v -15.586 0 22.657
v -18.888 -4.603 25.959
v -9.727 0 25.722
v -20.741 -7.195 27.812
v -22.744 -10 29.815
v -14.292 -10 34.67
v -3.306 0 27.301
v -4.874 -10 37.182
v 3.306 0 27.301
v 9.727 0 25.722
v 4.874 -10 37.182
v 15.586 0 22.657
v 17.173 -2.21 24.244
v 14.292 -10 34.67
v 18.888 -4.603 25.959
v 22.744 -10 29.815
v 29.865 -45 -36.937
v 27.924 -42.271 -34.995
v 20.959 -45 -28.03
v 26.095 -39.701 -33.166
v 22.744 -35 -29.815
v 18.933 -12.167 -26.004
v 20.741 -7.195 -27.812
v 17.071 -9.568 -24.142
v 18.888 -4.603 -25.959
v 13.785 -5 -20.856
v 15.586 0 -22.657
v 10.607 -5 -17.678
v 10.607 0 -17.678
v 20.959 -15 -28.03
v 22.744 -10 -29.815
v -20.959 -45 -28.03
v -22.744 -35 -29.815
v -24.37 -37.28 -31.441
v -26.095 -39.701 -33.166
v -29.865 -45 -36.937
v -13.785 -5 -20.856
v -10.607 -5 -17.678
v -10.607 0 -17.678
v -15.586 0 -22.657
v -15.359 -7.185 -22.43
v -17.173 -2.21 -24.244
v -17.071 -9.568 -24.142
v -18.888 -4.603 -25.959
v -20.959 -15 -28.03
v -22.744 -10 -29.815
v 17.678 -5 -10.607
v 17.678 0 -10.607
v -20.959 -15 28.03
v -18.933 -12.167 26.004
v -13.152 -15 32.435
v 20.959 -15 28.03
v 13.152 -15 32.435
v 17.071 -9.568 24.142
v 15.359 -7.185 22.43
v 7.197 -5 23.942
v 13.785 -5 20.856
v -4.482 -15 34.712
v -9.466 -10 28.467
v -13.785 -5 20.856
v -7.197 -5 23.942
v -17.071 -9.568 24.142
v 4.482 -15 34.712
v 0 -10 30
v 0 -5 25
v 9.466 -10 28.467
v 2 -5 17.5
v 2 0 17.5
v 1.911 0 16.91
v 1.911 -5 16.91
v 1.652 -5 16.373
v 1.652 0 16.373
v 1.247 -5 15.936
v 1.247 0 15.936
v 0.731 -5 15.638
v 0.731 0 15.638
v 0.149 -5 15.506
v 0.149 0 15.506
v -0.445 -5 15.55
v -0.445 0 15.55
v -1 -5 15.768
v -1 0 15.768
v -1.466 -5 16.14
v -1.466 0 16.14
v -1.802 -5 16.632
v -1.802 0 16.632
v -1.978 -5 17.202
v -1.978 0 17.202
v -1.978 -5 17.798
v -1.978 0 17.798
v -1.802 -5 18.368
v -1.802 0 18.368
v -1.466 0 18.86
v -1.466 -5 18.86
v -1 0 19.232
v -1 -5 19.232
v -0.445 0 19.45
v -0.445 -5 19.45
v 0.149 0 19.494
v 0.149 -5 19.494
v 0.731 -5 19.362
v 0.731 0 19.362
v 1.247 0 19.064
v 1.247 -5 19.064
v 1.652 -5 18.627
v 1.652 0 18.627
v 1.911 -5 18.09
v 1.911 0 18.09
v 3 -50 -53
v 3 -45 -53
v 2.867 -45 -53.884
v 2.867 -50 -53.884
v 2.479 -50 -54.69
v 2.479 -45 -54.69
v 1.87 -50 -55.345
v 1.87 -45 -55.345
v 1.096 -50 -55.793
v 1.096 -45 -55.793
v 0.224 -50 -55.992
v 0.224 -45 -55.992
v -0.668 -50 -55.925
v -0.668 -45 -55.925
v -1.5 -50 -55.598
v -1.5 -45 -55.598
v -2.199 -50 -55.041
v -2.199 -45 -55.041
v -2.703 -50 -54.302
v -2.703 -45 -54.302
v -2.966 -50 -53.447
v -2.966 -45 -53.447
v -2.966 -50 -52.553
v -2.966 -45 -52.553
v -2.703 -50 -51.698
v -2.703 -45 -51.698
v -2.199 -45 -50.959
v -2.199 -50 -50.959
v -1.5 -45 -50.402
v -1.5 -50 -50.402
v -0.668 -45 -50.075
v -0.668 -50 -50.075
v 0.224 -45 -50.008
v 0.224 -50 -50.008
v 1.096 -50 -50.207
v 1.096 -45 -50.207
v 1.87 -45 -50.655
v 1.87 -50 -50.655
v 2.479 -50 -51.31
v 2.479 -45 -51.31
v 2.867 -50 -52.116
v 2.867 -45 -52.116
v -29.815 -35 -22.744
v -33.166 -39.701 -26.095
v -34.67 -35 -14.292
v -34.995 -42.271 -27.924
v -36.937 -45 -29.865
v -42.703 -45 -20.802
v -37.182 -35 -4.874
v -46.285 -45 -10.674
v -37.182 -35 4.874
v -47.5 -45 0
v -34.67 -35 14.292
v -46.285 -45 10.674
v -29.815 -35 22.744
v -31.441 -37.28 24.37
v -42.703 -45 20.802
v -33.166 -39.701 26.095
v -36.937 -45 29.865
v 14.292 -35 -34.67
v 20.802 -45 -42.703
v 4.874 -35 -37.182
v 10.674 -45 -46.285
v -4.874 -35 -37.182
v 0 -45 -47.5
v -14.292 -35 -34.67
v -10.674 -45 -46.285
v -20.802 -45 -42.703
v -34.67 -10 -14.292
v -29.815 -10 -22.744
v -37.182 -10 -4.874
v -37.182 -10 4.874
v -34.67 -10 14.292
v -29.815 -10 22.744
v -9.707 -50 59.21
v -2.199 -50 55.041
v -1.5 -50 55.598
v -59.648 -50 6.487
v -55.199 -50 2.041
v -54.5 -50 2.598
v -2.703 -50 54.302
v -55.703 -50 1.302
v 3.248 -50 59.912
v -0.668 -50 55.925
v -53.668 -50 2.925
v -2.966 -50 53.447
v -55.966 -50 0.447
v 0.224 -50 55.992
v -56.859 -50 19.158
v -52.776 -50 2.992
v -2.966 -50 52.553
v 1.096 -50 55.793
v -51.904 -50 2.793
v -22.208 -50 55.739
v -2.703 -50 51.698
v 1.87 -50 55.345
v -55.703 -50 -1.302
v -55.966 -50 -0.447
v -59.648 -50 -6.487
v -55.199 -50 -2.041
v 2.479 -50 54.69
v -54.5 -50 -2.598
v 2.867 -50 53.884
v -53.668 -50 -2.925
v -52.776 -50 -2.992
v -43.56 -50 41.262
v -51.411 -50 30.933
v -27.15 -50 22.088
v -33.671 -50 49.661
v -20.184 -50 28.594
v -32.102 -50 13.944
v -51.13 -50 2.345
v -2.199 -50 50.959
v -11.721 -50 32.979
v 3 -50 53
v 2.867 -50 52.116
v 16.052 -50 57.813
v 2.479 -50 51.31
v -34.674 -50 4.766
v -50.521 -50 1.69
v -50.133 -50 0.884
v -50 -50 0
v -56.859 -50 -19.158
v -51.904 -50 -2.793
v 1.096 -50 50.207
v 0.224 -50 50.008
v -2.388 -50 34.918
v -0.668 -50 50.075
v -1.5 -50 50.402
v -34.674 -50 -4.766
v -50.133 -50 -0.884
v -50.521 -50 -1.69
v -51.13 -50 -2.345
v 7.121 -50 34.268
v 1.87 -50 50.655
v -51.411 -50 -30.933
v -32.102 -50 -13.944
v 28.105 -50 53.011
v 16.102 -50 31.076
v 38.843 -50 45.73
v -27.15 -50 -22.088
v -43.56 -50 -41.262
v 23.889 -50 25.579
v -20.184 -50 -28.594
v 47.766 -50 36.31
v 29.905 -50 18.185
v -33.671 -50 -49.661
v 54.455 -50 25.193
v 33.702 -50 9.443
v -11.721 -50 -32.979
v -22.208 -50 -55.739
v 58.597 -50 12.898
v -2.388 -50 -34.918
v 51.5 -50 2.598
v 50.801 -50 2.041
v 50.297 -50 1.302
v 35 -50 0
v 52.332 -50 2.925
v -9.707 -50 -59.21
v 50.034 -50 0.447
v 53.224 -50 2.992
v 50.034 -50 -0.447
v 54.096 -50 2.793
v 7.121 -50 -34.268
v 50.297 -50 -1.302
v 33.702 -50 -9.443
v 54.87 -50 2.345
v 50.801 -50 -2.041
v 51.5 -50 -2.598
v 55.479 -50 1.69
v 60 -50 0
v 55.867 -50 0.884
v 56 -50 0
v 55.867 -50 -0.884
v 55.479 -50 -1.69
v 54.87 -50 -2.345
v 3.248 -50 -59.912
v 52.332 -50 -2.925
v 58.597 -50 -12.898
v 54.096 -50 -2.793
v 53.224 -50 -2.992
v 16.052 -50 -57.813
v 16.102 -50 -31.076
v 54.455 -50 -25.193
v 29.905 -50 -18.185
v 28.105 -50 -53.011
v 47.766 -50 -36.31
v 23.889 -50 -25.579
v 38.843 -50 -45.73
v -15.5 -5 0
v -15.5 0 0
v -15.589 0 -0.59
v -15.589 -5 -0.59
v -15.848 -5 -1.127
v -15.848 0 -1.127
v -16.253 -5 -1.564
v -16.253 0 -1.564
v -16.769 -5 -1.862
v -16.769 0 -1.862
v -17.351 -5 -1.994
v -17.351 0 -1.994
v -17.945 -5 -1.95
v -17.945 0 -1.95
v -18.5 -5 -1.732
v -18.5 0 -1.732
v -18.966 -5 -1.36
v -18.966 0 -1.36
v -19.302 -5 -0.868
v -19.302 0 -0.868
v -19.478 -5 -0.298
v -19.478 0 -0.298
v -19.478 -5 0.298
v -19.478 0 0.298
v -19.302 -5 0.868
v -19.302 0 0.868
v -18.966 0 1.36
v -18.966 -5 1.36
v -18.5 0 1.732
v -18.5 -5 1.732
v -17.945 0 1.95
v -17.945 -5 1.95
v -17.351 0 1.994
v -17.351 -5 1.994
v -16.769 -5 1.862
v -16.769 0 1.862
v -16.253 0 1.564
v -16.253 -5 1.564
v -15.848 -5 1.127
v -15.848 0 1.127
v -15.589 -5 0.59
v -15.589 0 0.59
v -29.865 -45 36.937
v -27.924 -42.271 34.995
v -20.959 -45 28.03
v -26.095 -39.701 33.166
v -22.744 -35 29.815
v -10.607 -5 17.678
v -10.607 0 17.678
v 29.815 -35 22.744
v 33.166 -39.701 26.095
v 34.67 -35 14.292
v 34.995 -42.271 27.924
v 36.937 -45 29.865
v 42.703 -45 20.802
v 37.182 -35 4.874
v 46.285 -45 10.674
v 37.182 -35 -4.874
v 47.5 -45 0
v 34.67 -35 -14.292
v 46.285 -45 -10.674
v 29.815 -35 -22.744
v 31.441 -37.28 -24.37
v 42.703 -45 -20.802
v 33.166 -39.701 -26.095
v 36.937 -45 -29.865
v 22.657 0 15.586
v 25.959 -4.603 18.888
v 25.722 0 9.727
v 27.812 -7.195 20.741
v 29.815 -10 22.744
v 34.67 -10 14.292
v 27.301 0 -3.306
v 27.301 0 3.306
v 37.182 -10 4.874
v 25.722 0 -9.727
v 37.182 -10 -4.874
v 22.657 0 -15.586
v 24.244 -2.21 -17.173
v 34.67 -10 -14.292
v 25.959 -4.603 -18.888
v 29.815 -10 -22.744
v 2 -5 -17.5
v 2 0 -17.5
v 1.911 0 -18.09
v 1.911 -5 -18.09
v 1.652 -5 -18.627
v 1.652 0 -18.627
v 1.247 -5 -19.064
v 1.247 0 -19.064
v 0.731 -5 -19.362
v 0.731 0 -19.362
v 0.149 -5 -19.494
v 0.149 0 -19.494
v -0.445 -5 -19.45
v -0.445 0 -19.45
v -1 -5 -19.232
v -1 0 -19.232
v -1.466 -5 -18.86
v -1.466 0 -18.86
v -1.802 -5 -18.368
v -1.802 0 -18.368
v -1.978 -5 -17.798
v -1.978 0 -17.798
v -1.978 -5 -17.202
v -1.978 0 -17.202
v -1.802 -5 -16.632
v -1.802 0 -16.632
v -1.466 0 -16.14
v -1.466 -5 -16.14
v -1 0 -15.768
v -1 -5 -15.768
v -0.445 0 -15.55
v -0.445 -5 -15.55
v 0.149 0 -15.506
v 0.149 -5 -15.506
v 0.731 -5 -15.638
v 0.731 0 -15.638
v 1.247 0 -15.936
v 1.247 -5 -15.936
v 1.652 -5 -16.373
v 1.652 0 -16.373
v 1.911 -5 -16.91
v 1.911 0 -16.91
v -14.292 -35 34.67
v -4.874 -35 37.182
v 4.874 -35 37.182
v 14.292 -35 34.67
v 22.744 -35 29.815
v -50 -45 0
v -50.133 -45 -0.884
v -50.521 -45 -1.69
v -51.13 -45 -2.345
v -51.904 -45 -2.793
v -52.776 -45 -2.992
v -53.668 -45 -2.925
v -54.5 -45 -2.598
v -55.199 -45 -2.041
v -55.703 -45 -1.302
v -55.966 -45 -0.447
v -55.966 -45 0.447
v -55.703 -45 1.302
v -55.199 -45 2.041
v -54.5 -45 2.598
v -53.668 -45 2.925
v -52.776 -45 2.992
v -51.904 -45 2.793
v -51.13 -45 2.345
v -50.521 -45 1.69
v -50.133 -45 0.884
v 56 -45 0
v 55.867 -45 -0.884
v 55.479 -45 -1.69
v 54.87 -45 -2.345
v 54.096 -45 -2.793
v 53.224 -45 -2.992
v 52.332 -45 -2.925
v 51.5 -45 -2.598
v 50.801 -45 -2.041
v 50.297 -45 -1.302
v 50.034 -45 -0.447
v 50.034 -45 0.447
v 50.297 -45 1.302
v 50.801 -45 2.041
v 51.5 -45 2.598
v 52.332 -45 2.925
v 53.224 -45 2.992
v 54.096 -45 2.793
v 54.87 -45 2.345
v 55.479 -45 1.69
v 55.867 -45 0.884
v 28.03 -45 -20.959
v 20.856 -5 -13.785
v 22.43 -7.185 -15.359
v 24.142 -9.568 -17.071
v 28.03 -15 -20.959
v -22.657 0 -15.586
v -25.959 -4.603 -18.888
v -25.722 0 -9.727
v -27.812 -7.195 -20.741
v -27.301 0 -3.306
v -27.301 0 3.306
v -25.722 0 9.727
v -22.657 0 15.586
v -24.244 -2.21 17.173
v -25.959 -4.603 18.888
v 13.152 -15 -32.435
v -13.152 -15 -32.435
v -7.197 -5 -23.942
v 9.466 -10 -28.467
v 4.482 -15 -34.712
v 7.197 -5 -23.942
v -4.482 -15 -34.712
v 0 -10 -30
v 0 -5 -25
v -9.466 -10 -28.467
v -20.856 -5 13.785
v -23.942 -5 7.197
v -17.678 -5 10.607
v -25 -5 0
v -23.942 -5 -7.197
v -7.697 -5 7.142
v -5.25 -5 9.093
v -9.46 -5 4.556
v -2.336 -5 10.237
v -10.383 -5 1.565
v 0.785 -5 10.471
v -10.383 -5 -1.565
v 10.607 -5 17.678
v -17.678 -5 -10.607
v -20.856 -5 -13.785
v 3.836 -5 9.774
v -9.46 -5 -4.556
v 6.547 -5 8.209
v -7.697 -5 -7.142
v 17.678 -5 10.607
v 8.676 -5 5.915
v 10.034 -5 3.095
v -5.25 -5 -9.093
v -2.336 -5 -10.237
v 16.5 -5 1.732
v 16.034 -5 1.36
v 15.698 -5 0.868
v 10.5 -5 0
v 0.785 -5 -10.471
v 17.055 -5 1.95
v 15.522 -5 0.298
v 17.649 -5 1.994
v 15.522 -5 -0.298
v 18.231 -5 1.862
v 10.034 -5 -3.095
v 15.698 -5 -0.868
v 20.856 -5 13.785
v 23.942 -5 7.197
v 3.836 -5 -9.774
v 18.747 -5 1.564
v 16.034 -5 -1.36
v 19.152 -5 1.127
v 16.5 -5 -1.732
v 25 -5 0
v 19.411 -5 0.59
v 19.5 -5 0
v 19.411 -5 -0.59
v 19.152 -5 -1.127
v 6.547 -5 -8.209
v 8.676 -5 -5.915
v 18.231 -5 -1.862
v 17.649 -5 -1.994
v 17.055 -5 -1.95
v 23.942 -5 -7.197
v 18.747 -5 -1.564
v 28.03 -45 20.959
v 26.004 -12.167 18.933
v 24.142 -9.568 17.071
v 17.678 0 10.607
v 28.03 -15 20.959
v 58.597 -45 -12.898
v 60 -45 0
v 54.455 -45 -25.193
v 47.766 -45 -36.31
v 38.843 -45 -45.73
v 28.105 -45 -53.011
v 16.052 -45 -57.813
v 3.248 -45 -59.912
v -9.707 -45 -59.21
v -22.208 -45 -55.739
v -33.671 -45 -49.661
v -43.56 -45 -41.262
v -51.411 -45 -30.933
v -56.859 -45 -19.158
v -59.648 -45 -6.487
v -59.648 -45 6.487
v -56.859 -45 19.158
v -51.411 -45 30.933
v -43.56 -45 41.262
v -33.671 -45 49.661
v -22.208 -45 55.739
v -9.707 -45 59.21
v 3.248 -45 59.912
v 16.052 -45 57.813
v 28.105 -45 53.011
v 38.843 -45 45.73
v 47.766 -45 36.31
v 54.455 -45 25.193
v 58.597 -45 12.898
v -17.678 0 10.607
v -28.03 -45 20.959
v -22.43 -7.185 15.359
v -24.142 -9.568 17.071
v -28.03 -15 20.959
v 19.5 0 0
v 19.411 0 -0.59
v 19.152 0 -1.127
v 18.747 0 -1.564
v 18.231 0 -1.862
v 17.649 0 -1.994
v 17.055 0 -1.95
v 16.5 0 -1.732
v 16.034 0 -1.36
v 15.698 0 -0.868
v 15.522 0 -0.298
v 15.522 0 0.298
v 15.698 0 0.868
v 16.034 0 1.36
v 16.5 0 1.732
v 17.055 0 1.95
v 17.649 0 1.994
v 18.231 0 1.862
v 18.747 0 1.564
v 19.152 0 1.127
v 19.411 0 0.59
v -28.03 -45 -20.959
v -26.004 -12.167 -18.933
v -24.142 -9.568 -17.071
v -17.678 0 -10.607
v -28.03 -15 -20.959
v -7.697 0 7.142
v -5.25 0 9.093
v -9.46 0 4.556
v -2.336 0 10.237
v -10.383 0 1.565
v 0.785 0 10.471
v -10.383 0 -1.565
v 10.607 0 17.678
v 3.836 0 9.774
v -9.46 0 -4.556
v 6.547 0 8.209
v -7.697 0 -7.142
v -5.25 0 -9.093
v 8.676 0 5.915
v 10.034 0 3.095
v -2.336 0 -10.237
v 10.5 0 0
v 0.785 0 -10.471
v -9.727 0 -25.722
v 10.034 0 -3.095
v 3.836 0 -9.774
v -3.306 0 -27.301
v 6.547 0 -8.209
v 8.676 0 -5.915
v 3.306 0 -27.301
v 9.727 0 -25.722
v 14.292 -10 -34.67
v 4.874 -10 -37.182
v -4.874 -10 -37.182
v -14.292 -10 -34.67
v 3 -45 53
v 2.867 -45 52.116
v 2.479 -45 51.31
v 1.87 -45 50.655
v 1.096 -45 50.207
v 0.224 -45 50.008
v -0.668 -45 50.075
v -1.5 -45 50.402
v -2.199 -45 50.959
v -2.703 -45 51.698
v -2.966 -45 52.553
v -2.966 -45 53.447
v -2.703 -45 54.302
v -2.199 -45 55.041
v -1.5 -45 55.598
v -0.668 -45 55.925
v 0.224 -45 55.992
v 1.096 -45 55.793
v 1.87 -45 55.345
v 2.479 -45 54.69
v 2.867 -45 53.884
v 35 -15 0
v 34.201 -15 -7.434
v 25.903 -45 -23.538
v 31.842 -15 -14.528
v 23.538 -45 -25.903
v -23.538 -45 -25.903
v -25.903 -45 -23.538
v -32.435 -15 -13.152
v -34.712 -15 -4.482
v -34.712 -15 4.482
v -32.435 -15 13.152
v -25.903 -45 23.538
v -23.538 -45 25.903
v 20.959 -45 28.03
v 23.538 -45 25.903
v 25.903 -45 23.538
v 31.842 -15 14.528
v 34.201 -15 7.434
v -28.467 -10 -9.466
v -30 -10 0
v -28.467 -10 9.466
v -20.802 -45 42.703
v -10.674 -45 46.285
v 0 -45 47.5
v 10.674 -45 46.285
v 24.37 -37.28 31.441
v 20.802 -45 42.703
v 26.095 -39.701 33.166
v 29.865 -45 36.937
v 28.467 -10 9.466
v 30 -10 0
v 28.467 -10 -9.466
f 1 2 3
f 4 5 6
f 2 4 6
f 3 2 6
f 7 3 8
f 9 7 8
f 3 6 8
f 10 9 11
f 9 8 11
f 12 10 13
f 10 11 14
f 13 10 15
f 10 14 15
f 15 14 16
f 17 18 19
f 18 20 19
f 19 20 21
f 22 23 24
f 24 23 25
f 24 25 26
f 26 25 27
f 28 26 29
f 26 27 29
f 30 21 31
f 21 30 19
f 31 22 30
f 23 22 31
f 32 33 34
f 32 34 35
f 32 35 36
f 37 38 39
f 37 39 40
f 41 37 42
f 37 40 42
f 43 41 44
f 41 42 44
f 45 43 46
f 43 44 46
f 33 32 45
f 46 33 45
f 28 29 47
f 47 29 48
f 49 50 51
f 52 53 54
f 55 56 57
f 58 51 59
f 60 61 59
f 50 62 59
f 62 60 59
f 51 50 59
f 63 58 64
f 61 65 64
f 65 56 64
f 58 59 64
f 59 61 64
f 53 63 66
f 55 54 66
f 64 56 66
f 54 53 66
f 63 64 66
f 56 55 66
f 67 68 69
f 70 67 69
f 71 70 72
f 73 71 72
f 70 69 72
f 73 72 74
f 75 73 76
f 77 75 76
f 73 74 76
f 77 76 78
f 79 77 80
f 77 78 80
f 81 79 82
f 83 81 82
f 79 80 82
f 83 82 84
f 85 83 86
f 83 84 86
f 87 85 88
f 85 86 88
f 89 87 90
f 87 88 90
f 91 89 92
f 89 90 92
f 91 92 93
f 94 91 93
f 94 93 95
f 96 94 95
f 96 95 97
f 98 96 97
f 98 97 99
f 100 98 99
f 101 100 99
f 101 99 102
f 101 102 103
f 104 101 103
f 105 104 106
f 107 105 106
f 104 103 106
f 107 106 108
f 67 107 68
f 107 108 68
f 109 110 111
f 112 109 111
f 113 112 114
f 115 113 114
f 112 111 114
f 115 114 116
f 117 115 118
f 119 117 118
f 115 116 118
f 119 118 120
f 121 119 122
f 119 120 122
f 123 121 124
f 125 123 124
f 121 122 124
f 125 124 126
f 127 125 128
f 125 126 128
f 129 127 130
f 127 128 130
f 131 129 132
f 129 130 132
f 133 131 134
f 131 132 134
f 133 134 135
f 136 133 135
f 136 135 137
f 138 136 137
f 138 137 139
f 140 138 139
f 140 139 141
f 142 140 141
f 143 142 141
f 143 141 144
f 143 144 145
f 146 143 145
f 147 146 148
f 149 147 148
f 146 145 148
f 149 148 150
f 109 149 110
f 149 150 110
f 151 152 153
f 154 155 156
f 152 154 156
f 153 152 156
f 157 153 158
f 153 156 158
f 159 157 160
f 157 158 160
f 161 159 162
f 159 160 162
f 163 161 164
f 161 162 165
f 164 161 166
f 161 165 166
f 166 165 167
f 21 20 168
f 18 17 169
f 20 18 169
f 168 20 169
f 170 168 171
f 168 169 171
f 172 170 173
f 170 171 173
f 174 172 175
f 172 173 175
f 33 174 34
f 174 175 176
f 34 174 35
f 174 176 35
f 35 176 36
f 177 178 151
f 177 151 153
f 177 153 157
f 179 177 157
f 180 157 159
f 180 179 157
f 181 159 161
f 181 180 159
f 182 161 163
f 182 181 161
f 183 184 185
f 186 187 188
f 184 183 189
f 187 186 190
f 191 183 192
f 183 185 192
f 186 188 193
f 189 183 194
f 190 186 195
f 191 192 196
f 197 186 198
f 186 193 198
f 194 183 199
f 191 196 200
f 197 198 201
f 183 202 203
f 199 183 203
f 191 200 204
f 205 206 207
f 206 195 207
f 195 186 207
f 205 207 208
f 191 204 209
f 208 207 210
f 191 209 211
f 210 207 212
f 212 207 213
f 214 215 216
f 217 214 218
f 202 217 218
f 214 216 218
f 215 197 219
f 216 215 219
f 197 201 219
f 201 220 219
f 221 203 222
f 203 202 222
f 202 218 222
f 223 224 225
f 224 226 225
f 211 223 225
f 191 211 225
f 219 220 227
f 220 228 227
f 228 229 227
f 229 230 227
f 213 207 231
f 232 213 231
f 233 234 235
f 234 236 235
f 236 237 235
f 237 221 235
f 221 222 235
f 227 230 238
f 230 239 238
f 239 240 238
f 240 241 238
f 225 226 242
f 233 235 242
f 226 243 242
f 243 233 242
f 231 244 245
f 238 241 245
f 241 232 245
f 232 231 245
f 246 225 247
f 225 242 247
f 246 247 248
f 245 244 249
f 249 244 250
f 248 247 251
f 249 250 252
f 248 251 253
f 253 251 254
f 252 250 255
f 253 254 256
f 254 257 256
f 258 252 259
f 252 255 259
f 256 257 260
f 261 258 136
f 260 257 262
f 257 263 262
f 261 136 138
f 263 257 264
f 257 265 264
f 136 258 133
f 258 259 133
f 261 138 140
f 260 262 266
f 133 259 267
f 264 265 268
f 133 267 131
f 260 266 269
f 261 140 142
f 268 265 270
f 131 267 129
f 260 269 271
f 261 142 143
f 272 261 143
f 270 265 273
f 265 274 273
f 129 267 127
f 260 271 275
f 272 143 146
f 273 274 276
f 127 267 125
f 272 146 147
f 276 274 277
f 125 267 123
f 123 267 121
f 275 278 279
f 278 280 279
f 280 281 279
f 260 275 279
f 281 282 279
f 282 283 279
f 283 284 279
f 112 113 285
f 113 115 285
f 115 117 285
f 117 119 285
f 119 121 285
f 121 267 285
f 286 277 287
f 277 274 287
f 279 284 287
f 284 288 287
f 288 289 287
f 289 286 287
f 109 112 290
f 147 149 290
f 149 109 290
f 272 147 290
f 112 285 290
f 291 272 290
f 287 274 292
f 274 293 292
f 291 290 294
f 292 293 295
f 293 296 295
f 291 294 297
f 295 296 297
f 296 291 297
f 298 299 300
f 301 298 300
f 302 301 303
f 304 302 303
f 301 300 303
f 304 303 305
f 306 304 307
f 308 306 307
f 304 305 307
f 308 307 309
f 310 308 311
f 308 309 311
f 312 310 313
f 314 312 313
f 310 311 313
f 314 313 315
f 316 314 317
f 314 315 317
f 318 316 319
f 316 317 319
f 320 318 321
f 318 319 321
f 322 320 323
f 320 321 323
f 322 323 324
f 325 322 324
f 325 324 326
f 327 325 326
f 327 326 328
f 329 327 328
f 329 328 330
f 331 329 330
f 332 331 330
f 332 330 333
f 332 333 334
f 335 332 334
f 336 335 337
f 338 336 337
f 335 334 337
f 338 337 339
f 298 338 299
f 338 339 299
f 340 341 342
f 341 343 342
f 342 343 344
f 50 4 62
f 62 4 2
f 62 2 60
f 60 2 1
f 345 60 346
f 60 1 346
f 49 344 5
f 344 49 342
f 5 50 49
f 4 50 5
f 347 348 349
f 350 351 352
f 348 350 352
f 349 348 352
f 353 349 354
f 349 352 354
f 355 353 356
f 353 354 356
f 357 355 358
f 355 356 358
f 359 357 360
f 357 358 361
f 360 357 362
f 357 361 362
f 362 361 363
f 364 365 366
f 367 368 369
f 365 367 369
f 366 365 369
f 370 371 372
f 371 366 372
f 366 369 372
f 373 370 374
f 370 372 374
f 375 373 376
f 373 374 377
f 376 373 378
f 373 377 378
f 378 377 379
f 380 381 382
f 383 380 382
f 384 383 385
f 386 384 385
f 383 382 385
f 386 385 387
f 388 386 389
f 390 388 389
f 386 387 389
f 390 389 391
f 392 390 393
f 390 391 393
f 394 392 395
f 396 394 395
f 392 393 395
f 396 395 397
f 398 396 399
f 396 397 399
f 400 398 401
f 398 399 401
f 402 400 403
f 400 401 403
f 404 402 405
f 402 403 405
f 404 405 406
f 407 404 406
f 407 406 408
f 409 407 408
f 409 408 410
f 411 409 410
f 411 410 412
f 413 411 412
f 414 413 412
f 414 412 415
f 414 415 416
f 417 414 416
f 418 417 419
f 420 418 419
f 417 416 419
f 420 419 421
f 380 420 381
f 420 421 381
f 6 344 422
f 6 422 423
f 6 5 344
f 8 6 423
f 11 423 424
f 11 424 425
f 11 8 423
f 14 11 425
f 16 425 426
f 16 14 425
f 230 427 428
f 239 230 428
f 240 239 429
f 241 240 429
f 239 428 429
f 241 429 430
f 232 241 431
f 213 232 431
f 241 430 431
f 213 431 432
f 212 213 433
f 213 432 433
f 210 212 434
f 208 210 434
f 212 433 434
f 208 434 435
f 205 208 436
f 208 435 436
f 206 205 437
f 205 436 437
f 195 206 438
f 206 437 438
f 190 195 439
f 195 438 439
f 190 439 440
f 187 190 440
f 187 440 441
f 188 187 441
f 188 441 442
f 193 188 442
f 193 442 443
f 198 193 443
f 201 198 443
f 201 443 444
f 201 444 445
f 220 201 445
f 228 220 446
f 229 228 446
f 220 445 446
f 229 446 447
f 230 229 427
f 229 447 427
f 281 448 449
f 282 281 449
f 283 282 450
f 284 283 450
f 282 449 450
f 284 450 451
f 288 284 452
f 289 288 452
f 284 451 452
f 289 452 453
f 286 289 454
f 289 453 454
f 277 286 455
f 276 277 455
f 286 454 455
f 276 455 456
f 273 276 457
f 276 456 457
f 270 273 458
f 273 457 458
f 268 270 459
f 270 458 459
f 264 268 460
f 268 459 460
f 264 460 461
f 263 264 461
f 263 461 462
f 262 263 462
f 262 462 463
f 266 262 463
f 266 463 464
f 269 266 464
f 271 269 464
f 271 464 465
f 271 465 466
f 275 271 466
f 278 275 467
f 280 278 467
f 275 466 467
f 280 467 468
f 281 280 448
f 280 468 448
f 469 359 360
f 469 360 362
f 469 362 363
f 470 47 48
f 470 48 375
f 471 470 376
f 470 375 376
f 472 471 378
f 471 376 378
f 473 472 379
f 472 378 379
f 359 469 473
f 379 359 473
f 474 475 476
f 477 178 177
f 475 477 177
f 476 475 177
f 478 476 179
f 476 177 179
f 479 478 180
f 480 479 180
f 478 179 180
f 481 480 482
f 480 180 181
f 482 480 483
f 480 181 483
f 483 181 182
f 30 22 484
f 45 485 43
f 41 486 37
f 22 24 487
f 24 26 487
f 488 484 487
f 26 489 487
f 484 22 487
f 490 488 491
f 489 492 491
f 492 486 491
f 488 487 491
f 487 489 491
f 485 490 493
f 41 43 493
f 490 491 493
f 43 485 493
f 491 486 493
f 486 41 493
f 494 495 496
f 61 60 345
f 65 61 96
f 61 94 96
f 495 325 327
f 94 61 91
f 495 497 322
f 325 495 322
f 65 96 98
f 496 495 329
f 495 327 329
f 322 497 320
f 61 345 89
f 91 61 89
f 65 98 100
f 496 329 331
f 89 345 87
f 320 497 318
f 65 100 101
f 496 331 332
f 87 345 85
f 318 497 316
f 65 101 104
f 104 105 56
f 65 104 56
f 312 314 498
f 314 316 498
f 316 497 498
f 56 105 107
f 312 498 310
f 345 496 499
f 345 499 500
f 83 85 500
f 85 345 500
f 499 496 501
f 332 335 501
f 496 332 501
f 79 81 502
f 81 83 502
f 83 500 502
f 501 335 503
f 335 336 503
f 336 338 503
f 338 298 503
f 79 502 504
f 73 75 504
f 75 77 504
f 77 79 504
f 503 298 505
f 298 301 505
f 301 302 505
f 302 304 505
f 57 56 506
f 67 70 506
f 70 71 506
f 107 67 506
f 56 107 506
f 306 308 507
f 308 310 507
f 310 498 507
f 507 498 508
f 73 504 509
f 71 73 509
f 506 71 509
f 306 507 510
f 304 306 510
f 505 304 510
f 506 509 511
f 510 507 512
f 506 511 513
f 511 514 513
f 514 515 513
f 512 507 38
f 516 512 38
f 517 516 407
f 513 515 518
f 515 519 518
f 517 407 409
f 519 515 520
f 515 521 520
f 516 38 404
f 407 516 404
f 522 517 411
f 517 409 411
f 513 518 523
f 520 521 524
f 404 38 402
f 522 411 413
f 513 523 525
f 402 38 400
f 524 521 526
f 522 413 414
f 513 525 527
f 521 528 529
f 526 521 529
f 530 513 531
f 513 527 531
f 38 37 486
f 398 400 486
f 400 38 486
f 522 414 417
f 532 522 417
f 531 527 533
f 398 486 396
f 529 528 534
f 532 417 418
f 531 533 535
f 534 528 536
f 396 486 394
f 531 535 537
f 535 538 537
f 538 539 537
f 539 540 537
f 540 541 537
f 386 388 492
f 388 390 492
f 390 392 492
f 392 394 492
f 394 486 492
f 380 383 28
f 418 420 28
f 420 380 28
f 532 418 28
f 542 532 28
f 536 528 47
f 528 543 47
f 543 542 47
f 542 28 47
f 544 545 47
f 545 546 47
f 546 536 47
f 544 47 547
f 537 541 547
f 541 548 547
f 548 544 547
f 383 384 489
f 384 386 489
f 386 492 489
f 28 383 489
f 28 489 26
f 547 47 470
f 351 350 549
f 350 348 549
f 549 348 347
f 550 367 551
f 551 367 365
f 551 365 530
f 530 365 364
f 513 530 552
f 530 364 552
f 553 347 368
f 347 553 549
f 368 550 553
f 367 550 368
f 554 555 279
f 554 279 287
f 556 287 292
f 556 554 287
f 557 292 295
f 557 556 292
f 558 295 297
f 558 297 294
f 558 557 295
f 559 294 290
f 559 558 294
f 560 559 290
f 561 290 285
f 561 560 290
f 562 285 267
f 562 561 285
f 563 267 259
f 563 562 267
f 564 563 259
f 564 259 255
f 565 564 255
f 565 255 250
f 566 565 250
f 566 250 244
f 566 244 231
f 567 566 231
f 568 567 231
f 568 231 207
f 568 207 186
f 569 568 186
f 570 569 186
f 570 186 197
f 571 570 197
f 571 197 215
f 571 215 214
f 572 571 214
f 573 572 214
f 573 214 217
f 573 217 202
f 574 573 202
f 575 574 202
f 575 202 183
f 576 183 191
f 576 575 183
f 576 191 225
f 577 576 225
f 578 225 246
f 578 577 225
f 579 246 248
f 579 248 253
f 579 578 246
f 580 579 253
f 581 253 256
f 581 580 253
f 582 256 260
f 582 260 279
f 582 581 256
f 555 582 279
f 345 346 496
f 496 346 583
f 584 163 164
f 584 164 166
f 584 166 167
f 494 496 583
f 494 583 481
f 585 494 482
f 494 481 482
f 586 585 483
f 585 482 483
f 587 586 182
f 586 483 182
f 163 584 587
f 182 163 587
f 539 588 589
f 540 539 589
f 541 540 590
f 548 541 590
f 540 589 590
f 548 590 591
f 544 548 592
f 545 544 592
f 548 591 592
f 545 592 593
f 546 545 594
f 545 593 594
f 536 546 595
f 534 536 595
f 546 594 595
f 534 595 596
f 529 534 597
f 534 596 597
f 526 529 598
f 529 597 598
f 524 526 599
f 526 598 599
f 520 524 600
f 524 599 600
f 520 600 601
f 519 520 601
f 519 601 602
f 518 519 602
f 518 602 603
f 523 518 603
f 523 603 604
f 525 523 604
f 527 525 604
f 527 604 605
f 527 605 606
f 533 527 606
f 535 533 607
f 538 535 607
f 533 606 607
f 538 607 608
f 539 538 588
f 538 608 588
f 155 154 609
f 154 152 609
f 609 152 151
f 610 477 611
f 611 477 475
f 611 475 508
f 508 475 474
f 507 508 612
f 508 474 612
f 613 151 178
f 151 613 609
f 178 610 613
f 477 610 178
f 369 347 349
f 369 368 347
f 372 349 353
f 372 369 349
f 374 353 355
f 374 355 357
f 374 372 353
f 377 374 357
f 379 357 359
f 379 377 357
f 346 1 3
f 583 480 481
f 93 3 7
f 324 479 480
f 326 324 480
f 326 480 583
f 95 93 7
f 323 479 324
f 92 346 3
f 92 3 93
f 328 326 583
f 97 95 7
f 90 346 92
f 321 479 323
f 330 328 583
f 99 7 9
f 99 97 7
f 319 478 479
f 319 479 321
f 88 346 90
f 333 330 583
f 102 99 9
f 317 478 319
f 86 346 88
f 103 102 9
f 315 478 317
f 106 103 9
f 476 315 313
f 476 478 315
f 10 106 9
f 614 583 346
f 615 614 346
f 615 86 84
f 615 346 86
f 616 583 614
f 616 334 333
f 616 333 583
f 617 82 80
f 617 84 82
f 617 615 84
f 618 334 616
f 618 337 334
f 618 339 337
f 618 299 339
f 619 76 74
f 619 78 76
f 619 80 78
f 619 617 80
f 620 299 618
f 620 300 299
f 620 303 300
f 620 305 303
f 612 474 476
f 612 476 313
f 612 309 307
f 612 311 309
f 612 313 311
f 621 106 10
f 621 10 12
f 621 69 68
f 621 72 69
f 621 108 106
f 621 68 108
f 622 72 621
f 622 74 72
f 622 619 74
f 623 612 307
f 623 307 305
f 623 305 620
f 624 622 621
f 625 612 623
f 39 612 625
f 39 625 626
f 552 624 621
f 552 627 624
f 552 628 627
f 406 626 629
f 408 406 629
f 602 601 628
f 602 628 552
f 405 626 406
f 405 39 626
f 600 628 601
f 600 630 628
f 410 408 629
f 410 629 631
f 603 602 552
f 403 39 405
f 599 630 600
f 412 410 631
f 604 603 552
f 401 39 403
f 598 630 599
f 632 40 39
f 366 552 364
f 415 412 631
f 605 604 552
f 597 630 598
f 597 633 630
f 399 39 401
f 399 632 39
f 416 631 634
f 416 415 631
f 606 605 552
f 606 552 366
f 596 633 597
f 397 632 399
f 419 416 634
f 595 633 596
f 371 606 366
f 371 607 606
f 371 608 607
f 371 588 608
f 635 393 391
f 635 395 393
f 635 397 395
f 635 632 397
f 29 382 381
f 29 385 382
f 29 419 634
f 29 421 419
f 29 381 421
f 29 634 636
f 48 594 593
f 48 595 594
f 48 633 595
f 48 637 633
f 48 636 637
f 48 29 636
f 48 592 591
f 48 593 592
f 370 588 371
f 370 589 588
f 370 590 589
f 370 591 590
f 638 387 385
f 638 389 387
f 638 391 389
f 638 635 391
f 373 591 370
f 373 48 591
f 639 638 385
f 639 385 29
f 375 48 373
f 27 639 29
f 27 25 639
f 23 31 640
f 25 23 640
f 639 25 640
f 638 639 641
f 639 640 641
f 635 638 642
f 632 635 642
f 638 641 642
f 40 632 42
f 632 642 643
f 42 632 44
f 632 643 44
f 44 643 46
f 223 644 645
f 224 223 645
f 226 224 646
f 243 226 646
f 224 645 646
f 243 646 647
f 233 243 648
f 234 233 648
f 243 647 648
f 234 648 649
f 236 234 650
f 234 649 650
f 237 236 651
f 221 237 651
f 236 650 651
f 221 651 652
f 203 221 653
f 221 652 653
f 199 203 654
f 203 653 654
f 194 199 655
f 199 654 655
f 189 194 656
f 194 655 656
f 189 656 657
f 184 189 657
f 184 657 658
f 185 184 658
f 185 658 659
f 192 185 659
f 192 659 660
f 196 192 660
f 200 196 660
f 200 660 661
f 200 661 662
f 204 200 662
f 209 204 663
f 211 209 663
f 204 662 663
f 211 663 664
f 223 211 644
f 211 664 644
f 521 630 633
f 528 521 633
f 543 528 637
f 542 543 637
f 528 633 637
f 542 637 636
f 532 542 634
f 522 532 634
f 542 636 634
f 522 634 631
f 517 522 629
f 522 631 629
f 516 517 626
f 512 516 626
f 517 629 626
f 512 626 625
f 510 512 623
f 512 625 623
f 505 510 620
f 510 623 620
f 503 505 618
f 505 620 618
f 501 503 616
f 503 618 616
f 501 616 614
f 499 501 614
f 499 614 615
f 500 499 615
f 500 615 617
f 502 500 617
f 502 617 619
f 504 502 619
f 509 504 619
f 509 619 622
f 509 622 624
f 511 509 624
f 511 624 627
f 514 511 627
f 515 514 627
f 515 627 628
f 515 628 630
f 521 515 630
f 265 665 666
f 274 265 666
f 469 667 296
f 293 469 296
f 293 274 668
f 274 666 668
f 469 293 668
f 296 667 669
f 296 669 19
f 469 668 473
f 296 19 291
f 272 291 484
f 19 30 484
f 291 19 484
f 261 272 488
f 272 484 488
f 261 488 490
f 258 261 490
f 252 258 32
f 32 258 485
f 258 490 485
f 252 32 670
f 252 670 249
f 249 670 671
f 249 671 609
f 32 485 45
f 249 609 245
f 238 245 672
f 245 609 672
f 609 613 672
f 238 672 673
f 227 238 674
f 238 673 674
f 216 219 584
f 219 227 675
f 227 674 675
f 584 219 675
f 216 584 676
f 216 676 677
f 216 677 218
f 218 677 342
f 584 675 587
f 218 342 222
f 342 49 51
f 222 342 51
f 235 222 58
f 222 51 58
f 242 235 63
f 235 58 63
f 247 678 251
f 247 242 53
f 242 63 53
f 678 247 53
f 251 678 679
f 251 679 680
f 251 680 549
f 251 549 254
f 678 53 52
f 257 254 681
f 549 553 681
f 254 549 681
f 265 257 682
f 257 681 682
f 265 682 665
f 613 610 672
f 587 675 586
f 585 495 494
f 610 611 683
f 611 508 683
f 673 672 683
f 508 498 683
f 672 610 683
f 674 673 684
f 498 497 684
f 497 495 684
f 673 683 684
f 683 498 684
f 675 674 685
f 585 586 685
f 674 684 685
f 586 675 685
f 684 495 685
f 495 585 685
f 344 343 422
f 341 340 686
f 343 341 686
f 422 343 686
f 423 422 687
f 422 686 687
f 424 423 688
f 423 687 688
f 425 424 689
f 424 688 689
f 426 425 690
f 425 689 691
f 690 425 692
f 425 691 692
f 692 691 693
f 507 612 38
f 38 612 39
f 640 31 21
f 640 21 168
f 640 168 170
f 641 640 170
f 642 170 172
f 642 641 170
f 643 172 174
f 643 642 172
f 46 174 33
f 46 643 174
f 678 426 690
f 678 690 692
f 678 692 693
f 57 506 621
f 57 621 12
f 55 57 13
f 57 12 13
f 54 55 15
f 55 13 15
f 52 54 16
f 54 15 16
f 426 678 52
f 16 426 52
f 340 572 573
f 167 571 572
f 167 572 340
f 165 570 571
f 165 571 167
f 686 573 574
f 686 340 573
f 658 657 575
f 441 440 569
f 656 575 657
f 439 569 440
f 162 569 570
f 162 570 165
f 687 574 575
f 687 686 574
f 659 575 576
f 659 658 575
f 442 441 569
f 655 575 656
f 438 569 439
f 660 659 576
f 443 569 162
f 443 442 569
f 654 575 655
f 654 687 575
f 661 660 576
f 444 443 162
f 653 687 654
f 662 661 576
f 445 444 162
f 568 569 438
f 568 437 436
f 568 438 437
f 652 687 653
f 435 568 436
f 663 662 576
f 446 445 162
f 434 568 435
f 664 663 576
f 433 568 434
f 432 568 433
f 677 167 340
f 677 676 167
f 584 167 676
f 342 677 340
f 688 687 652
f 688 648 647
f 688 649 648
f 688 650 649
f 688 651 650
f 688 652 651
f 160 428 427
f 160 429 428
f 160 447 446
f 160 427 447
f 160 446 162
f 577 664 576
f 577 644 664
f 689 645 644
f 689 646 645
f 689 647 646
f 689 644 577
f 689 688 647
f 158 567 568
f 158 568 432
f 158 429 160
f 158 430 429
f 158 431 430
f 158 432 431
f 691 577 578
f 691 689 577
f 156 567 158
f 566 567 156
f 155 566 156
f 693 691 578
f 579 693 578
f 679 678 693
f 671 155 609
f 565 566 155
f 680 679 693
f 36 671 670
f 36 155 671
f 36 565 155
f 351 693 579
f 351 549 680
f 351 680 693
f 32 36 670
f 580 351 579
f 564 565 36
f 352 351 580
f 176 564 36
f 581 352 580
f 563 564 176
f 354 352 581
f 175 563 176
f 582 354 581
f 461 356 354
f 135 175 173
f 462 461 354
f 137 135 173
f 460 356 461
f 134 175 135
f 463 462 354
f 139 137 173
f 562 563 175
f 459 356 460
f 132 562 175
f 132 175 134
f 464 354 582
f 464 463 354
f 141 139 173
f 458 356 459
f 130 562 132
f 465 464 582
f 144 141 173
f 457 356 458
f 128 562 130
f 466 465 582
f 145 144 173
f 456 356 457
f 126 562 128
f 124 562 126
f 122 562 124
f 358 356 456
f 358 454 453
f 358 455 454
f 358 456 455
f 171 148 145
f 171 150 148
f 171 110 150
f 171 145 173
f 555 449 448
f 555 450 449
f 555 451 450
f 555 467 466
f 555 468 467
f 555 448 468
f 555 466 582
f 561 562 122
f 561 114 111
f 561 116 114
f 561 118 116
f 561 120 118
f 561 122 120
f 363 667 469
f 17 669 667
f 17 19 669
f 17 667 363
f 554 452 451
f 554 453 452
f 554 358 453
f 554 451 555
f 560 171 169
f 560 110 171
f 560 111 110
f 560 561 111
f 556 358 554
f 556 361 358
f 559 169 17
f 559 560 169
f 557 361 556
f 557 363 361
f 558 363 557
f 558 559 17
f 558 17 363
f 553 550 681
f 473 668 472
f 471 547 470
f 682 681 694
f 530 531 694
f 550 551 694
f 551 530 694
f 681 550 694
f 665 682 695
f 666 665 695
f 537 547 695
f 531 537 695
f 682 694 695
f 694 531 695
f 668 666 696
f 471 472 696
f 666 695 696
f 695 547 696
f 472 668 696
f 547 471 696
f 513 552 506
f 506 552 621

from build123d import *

# Parameters (mm, degrees)
SKETCH1_R                  = 60
STOCK_DEPTH                = 50
HOLLOWINTERIOR_REACH       = 57
HOLLOWINTERIOR_START       = -5
SKETCH8_R                  = 35
SKETCH7_R                  = 10.5
HOLEFORMOTORSHAFT_DEPTH    = 51
SKETCH9_OUTSIDE_W          = 157.384
SKETCH9_OUTSIDE_H          = 157.384
SKETCH9_OUTSIDE_R          = 37.5
EXTERIORLATHE_DEPTH        = 45
CHAMFER1_SIZE              = 10
CHAMFER2_SIZE              = 10
CHAMFER3_SIZE              = 10
SLOTSFORFUN_DEPTH          = 45
SKETCH13_R                 = 2
GEARBOXMOUNTINGHOLES_DEPTH = 5
CUT_EXTRUDE5_START         = -45
SKETCH14_R                 = 3
CUT_EXTRUDE5_DEPTH         = 5


with BuildPart() as part:
    # Sketch1 → Stock (new body)
    with BuildSketch(Plane(origin=(0, 0, 0), x_dir=(1, 0, 0), z_dir=(0, 1, 0))):
        Circle(SKETCH1_R)
    extrude(amount=-STOCK_DEPTH)

    # Sketch8 → HollowInterior (cut, up to next)
    with BuildSketch(Plane(origin=(0, 0, 0), x_dir=(1, 0, 0), z_dir=(0, 1, 0)).offset(HOLLOWINTERIOR_START), mode=Mode.PRIVATE) as hollowinterior_sk1:
        Circle(SKETCH8_R)
    hollowinterior_tool1 = extrude(hollowinterior_sk1.sketch, amount=-HOLLOWINTERIOR_REACH, mode=Mode.PRIVATE) & part.part
    add(hollowinterior_tool1.solids().sort_by_distance((0, -5, 0))[0], mode=Mode.SUBTRACT)

    # Sketch7 → HoleForMotorShaft (cut, through all)
    with BuildSketch(Plane(origin=(0, 0, 0), x_dir=(1, 0, 0), z_dir=(0, 1, 0))):
        Circle(SKETCH7_R)
    extrude(amount=-HOLEFORMOTORSHAFT_DEPTH, mode=Mode.SUBTRACT)

    # Sketch9 outside → ExteriorLathe (cut)
    with BuildSketch(Plane(origin=(0, 0, 0), x_dir=(1, 0, 0), z_dir=(0, 1, 0))):
        Rectangle(SKETCH9_OUTSIDE_W, SKETCH9_OUTSIDE_H)
        Circle(SKETCH9_OUTSIDE_R, mode=Mode.SUBTRACT)
    extrude(amount=-EXTERIORLATHE_DEPTH, mode=Mode.SUBTRACT)

    # Chamfer1
    chamfer1_edges = [part.edges().sort_by_distance(p)[0] for p in [
        (-35, -5, 0),
    ]]
    chamfer(chamfer1_edges, length=CHAMFER1_SIZE)

    # Chamfer2
    chamfer2_edges = [part.edges().sort_by_distance(p)[0] for p in [
        (-37.5, 0, 0),
    ]]
    chamfer(chamfer2_edges, length=CHAMFER2_SIZE)

    # Chamfer3
    chamfer3_edges = [part.edges().sort_by_distance(p)[0] for p in [
        (-37.5, -45, 0),
    ]]
    chamfer(chamfer3_edges, length=CHAMFER3_SIZE)

    # Sketch10 → SlotsForFun (cut)
    with BuildSketch(Plane(origin=(0, 0, 0), x_dir=(1, 0, 0), z_dir=(0, 1, 0))):
        Polygon((-10.606601718, 17.67766953), (-30.0520382, 37.123106012), (-37.123106012, 30.0520382), (-17.67766953, 10.606601718), align=None)
        Polygon((17.67766953, 10.606601718), (37.123106012, 30.0520382), (30.0520382, 37.123106012), (10.606601718, 17.67766953), align=None)
        Polygon((10.606601718, -17.67766953), (30.0520382, -37.123106012), (37.123106012, -30.0520382), (17.67766953, -10.606601718), align=None)
        Polygon((-17.67766953, -10.606601718), (-37.123106012, -30.0520382), (-30.0520382, -37.123106012), (-10.606601718, -17.67766953), align=None)
    extrude(amount=-SLOTSFORFUN_DEPTH, mode=Mode.SUBTRACT)

    # Sketch13 → GearboxMountingHoles (cut)
    with BuildSketch(Plane(origin=(0, 0, 0), x_dir=(1, 0, 0), z_dir=(0, 1, 0))):
        with Locations((0, 17.5)):
            Circle(SKETCH13_R)
        with Locations((17.5, 0)):
            Circle(SKETCH13_R)
        with Locations((0, -17.5)):
            Circle(SKETCH13_R)
        with Locations((-17.5, 0)):
            Circle(SKETCH13_R)
    extrude(amount=-GEARBOXMOUNTINGHOLES_DEPTH, mode=Mode.SUBTRACT)

    # Sketch14 → Cut-Extrude5 (cut)
    with BuildSketch(Plane(origin=(0, 0, 0), x_dir=(1, 0, 0), z_dir=(0, 1, 0)).offset(CUT_EXTRUDE5_START)):
        with Locations((0, 53)):
            Circle(SKETCH14_R)
        with Locations((53, 0)):
            Circle(SKETCH14_R)
        with Locations((0, -53)):
            Circle(SKETCH14_R)
        with Locations((-53, 0)):
            Circle(SKETCH14_R)
    extrude(amount=-CUT_EXTRUDE5_DEPTH, mode=Mode.SUBTRACT)


solid = part.part
